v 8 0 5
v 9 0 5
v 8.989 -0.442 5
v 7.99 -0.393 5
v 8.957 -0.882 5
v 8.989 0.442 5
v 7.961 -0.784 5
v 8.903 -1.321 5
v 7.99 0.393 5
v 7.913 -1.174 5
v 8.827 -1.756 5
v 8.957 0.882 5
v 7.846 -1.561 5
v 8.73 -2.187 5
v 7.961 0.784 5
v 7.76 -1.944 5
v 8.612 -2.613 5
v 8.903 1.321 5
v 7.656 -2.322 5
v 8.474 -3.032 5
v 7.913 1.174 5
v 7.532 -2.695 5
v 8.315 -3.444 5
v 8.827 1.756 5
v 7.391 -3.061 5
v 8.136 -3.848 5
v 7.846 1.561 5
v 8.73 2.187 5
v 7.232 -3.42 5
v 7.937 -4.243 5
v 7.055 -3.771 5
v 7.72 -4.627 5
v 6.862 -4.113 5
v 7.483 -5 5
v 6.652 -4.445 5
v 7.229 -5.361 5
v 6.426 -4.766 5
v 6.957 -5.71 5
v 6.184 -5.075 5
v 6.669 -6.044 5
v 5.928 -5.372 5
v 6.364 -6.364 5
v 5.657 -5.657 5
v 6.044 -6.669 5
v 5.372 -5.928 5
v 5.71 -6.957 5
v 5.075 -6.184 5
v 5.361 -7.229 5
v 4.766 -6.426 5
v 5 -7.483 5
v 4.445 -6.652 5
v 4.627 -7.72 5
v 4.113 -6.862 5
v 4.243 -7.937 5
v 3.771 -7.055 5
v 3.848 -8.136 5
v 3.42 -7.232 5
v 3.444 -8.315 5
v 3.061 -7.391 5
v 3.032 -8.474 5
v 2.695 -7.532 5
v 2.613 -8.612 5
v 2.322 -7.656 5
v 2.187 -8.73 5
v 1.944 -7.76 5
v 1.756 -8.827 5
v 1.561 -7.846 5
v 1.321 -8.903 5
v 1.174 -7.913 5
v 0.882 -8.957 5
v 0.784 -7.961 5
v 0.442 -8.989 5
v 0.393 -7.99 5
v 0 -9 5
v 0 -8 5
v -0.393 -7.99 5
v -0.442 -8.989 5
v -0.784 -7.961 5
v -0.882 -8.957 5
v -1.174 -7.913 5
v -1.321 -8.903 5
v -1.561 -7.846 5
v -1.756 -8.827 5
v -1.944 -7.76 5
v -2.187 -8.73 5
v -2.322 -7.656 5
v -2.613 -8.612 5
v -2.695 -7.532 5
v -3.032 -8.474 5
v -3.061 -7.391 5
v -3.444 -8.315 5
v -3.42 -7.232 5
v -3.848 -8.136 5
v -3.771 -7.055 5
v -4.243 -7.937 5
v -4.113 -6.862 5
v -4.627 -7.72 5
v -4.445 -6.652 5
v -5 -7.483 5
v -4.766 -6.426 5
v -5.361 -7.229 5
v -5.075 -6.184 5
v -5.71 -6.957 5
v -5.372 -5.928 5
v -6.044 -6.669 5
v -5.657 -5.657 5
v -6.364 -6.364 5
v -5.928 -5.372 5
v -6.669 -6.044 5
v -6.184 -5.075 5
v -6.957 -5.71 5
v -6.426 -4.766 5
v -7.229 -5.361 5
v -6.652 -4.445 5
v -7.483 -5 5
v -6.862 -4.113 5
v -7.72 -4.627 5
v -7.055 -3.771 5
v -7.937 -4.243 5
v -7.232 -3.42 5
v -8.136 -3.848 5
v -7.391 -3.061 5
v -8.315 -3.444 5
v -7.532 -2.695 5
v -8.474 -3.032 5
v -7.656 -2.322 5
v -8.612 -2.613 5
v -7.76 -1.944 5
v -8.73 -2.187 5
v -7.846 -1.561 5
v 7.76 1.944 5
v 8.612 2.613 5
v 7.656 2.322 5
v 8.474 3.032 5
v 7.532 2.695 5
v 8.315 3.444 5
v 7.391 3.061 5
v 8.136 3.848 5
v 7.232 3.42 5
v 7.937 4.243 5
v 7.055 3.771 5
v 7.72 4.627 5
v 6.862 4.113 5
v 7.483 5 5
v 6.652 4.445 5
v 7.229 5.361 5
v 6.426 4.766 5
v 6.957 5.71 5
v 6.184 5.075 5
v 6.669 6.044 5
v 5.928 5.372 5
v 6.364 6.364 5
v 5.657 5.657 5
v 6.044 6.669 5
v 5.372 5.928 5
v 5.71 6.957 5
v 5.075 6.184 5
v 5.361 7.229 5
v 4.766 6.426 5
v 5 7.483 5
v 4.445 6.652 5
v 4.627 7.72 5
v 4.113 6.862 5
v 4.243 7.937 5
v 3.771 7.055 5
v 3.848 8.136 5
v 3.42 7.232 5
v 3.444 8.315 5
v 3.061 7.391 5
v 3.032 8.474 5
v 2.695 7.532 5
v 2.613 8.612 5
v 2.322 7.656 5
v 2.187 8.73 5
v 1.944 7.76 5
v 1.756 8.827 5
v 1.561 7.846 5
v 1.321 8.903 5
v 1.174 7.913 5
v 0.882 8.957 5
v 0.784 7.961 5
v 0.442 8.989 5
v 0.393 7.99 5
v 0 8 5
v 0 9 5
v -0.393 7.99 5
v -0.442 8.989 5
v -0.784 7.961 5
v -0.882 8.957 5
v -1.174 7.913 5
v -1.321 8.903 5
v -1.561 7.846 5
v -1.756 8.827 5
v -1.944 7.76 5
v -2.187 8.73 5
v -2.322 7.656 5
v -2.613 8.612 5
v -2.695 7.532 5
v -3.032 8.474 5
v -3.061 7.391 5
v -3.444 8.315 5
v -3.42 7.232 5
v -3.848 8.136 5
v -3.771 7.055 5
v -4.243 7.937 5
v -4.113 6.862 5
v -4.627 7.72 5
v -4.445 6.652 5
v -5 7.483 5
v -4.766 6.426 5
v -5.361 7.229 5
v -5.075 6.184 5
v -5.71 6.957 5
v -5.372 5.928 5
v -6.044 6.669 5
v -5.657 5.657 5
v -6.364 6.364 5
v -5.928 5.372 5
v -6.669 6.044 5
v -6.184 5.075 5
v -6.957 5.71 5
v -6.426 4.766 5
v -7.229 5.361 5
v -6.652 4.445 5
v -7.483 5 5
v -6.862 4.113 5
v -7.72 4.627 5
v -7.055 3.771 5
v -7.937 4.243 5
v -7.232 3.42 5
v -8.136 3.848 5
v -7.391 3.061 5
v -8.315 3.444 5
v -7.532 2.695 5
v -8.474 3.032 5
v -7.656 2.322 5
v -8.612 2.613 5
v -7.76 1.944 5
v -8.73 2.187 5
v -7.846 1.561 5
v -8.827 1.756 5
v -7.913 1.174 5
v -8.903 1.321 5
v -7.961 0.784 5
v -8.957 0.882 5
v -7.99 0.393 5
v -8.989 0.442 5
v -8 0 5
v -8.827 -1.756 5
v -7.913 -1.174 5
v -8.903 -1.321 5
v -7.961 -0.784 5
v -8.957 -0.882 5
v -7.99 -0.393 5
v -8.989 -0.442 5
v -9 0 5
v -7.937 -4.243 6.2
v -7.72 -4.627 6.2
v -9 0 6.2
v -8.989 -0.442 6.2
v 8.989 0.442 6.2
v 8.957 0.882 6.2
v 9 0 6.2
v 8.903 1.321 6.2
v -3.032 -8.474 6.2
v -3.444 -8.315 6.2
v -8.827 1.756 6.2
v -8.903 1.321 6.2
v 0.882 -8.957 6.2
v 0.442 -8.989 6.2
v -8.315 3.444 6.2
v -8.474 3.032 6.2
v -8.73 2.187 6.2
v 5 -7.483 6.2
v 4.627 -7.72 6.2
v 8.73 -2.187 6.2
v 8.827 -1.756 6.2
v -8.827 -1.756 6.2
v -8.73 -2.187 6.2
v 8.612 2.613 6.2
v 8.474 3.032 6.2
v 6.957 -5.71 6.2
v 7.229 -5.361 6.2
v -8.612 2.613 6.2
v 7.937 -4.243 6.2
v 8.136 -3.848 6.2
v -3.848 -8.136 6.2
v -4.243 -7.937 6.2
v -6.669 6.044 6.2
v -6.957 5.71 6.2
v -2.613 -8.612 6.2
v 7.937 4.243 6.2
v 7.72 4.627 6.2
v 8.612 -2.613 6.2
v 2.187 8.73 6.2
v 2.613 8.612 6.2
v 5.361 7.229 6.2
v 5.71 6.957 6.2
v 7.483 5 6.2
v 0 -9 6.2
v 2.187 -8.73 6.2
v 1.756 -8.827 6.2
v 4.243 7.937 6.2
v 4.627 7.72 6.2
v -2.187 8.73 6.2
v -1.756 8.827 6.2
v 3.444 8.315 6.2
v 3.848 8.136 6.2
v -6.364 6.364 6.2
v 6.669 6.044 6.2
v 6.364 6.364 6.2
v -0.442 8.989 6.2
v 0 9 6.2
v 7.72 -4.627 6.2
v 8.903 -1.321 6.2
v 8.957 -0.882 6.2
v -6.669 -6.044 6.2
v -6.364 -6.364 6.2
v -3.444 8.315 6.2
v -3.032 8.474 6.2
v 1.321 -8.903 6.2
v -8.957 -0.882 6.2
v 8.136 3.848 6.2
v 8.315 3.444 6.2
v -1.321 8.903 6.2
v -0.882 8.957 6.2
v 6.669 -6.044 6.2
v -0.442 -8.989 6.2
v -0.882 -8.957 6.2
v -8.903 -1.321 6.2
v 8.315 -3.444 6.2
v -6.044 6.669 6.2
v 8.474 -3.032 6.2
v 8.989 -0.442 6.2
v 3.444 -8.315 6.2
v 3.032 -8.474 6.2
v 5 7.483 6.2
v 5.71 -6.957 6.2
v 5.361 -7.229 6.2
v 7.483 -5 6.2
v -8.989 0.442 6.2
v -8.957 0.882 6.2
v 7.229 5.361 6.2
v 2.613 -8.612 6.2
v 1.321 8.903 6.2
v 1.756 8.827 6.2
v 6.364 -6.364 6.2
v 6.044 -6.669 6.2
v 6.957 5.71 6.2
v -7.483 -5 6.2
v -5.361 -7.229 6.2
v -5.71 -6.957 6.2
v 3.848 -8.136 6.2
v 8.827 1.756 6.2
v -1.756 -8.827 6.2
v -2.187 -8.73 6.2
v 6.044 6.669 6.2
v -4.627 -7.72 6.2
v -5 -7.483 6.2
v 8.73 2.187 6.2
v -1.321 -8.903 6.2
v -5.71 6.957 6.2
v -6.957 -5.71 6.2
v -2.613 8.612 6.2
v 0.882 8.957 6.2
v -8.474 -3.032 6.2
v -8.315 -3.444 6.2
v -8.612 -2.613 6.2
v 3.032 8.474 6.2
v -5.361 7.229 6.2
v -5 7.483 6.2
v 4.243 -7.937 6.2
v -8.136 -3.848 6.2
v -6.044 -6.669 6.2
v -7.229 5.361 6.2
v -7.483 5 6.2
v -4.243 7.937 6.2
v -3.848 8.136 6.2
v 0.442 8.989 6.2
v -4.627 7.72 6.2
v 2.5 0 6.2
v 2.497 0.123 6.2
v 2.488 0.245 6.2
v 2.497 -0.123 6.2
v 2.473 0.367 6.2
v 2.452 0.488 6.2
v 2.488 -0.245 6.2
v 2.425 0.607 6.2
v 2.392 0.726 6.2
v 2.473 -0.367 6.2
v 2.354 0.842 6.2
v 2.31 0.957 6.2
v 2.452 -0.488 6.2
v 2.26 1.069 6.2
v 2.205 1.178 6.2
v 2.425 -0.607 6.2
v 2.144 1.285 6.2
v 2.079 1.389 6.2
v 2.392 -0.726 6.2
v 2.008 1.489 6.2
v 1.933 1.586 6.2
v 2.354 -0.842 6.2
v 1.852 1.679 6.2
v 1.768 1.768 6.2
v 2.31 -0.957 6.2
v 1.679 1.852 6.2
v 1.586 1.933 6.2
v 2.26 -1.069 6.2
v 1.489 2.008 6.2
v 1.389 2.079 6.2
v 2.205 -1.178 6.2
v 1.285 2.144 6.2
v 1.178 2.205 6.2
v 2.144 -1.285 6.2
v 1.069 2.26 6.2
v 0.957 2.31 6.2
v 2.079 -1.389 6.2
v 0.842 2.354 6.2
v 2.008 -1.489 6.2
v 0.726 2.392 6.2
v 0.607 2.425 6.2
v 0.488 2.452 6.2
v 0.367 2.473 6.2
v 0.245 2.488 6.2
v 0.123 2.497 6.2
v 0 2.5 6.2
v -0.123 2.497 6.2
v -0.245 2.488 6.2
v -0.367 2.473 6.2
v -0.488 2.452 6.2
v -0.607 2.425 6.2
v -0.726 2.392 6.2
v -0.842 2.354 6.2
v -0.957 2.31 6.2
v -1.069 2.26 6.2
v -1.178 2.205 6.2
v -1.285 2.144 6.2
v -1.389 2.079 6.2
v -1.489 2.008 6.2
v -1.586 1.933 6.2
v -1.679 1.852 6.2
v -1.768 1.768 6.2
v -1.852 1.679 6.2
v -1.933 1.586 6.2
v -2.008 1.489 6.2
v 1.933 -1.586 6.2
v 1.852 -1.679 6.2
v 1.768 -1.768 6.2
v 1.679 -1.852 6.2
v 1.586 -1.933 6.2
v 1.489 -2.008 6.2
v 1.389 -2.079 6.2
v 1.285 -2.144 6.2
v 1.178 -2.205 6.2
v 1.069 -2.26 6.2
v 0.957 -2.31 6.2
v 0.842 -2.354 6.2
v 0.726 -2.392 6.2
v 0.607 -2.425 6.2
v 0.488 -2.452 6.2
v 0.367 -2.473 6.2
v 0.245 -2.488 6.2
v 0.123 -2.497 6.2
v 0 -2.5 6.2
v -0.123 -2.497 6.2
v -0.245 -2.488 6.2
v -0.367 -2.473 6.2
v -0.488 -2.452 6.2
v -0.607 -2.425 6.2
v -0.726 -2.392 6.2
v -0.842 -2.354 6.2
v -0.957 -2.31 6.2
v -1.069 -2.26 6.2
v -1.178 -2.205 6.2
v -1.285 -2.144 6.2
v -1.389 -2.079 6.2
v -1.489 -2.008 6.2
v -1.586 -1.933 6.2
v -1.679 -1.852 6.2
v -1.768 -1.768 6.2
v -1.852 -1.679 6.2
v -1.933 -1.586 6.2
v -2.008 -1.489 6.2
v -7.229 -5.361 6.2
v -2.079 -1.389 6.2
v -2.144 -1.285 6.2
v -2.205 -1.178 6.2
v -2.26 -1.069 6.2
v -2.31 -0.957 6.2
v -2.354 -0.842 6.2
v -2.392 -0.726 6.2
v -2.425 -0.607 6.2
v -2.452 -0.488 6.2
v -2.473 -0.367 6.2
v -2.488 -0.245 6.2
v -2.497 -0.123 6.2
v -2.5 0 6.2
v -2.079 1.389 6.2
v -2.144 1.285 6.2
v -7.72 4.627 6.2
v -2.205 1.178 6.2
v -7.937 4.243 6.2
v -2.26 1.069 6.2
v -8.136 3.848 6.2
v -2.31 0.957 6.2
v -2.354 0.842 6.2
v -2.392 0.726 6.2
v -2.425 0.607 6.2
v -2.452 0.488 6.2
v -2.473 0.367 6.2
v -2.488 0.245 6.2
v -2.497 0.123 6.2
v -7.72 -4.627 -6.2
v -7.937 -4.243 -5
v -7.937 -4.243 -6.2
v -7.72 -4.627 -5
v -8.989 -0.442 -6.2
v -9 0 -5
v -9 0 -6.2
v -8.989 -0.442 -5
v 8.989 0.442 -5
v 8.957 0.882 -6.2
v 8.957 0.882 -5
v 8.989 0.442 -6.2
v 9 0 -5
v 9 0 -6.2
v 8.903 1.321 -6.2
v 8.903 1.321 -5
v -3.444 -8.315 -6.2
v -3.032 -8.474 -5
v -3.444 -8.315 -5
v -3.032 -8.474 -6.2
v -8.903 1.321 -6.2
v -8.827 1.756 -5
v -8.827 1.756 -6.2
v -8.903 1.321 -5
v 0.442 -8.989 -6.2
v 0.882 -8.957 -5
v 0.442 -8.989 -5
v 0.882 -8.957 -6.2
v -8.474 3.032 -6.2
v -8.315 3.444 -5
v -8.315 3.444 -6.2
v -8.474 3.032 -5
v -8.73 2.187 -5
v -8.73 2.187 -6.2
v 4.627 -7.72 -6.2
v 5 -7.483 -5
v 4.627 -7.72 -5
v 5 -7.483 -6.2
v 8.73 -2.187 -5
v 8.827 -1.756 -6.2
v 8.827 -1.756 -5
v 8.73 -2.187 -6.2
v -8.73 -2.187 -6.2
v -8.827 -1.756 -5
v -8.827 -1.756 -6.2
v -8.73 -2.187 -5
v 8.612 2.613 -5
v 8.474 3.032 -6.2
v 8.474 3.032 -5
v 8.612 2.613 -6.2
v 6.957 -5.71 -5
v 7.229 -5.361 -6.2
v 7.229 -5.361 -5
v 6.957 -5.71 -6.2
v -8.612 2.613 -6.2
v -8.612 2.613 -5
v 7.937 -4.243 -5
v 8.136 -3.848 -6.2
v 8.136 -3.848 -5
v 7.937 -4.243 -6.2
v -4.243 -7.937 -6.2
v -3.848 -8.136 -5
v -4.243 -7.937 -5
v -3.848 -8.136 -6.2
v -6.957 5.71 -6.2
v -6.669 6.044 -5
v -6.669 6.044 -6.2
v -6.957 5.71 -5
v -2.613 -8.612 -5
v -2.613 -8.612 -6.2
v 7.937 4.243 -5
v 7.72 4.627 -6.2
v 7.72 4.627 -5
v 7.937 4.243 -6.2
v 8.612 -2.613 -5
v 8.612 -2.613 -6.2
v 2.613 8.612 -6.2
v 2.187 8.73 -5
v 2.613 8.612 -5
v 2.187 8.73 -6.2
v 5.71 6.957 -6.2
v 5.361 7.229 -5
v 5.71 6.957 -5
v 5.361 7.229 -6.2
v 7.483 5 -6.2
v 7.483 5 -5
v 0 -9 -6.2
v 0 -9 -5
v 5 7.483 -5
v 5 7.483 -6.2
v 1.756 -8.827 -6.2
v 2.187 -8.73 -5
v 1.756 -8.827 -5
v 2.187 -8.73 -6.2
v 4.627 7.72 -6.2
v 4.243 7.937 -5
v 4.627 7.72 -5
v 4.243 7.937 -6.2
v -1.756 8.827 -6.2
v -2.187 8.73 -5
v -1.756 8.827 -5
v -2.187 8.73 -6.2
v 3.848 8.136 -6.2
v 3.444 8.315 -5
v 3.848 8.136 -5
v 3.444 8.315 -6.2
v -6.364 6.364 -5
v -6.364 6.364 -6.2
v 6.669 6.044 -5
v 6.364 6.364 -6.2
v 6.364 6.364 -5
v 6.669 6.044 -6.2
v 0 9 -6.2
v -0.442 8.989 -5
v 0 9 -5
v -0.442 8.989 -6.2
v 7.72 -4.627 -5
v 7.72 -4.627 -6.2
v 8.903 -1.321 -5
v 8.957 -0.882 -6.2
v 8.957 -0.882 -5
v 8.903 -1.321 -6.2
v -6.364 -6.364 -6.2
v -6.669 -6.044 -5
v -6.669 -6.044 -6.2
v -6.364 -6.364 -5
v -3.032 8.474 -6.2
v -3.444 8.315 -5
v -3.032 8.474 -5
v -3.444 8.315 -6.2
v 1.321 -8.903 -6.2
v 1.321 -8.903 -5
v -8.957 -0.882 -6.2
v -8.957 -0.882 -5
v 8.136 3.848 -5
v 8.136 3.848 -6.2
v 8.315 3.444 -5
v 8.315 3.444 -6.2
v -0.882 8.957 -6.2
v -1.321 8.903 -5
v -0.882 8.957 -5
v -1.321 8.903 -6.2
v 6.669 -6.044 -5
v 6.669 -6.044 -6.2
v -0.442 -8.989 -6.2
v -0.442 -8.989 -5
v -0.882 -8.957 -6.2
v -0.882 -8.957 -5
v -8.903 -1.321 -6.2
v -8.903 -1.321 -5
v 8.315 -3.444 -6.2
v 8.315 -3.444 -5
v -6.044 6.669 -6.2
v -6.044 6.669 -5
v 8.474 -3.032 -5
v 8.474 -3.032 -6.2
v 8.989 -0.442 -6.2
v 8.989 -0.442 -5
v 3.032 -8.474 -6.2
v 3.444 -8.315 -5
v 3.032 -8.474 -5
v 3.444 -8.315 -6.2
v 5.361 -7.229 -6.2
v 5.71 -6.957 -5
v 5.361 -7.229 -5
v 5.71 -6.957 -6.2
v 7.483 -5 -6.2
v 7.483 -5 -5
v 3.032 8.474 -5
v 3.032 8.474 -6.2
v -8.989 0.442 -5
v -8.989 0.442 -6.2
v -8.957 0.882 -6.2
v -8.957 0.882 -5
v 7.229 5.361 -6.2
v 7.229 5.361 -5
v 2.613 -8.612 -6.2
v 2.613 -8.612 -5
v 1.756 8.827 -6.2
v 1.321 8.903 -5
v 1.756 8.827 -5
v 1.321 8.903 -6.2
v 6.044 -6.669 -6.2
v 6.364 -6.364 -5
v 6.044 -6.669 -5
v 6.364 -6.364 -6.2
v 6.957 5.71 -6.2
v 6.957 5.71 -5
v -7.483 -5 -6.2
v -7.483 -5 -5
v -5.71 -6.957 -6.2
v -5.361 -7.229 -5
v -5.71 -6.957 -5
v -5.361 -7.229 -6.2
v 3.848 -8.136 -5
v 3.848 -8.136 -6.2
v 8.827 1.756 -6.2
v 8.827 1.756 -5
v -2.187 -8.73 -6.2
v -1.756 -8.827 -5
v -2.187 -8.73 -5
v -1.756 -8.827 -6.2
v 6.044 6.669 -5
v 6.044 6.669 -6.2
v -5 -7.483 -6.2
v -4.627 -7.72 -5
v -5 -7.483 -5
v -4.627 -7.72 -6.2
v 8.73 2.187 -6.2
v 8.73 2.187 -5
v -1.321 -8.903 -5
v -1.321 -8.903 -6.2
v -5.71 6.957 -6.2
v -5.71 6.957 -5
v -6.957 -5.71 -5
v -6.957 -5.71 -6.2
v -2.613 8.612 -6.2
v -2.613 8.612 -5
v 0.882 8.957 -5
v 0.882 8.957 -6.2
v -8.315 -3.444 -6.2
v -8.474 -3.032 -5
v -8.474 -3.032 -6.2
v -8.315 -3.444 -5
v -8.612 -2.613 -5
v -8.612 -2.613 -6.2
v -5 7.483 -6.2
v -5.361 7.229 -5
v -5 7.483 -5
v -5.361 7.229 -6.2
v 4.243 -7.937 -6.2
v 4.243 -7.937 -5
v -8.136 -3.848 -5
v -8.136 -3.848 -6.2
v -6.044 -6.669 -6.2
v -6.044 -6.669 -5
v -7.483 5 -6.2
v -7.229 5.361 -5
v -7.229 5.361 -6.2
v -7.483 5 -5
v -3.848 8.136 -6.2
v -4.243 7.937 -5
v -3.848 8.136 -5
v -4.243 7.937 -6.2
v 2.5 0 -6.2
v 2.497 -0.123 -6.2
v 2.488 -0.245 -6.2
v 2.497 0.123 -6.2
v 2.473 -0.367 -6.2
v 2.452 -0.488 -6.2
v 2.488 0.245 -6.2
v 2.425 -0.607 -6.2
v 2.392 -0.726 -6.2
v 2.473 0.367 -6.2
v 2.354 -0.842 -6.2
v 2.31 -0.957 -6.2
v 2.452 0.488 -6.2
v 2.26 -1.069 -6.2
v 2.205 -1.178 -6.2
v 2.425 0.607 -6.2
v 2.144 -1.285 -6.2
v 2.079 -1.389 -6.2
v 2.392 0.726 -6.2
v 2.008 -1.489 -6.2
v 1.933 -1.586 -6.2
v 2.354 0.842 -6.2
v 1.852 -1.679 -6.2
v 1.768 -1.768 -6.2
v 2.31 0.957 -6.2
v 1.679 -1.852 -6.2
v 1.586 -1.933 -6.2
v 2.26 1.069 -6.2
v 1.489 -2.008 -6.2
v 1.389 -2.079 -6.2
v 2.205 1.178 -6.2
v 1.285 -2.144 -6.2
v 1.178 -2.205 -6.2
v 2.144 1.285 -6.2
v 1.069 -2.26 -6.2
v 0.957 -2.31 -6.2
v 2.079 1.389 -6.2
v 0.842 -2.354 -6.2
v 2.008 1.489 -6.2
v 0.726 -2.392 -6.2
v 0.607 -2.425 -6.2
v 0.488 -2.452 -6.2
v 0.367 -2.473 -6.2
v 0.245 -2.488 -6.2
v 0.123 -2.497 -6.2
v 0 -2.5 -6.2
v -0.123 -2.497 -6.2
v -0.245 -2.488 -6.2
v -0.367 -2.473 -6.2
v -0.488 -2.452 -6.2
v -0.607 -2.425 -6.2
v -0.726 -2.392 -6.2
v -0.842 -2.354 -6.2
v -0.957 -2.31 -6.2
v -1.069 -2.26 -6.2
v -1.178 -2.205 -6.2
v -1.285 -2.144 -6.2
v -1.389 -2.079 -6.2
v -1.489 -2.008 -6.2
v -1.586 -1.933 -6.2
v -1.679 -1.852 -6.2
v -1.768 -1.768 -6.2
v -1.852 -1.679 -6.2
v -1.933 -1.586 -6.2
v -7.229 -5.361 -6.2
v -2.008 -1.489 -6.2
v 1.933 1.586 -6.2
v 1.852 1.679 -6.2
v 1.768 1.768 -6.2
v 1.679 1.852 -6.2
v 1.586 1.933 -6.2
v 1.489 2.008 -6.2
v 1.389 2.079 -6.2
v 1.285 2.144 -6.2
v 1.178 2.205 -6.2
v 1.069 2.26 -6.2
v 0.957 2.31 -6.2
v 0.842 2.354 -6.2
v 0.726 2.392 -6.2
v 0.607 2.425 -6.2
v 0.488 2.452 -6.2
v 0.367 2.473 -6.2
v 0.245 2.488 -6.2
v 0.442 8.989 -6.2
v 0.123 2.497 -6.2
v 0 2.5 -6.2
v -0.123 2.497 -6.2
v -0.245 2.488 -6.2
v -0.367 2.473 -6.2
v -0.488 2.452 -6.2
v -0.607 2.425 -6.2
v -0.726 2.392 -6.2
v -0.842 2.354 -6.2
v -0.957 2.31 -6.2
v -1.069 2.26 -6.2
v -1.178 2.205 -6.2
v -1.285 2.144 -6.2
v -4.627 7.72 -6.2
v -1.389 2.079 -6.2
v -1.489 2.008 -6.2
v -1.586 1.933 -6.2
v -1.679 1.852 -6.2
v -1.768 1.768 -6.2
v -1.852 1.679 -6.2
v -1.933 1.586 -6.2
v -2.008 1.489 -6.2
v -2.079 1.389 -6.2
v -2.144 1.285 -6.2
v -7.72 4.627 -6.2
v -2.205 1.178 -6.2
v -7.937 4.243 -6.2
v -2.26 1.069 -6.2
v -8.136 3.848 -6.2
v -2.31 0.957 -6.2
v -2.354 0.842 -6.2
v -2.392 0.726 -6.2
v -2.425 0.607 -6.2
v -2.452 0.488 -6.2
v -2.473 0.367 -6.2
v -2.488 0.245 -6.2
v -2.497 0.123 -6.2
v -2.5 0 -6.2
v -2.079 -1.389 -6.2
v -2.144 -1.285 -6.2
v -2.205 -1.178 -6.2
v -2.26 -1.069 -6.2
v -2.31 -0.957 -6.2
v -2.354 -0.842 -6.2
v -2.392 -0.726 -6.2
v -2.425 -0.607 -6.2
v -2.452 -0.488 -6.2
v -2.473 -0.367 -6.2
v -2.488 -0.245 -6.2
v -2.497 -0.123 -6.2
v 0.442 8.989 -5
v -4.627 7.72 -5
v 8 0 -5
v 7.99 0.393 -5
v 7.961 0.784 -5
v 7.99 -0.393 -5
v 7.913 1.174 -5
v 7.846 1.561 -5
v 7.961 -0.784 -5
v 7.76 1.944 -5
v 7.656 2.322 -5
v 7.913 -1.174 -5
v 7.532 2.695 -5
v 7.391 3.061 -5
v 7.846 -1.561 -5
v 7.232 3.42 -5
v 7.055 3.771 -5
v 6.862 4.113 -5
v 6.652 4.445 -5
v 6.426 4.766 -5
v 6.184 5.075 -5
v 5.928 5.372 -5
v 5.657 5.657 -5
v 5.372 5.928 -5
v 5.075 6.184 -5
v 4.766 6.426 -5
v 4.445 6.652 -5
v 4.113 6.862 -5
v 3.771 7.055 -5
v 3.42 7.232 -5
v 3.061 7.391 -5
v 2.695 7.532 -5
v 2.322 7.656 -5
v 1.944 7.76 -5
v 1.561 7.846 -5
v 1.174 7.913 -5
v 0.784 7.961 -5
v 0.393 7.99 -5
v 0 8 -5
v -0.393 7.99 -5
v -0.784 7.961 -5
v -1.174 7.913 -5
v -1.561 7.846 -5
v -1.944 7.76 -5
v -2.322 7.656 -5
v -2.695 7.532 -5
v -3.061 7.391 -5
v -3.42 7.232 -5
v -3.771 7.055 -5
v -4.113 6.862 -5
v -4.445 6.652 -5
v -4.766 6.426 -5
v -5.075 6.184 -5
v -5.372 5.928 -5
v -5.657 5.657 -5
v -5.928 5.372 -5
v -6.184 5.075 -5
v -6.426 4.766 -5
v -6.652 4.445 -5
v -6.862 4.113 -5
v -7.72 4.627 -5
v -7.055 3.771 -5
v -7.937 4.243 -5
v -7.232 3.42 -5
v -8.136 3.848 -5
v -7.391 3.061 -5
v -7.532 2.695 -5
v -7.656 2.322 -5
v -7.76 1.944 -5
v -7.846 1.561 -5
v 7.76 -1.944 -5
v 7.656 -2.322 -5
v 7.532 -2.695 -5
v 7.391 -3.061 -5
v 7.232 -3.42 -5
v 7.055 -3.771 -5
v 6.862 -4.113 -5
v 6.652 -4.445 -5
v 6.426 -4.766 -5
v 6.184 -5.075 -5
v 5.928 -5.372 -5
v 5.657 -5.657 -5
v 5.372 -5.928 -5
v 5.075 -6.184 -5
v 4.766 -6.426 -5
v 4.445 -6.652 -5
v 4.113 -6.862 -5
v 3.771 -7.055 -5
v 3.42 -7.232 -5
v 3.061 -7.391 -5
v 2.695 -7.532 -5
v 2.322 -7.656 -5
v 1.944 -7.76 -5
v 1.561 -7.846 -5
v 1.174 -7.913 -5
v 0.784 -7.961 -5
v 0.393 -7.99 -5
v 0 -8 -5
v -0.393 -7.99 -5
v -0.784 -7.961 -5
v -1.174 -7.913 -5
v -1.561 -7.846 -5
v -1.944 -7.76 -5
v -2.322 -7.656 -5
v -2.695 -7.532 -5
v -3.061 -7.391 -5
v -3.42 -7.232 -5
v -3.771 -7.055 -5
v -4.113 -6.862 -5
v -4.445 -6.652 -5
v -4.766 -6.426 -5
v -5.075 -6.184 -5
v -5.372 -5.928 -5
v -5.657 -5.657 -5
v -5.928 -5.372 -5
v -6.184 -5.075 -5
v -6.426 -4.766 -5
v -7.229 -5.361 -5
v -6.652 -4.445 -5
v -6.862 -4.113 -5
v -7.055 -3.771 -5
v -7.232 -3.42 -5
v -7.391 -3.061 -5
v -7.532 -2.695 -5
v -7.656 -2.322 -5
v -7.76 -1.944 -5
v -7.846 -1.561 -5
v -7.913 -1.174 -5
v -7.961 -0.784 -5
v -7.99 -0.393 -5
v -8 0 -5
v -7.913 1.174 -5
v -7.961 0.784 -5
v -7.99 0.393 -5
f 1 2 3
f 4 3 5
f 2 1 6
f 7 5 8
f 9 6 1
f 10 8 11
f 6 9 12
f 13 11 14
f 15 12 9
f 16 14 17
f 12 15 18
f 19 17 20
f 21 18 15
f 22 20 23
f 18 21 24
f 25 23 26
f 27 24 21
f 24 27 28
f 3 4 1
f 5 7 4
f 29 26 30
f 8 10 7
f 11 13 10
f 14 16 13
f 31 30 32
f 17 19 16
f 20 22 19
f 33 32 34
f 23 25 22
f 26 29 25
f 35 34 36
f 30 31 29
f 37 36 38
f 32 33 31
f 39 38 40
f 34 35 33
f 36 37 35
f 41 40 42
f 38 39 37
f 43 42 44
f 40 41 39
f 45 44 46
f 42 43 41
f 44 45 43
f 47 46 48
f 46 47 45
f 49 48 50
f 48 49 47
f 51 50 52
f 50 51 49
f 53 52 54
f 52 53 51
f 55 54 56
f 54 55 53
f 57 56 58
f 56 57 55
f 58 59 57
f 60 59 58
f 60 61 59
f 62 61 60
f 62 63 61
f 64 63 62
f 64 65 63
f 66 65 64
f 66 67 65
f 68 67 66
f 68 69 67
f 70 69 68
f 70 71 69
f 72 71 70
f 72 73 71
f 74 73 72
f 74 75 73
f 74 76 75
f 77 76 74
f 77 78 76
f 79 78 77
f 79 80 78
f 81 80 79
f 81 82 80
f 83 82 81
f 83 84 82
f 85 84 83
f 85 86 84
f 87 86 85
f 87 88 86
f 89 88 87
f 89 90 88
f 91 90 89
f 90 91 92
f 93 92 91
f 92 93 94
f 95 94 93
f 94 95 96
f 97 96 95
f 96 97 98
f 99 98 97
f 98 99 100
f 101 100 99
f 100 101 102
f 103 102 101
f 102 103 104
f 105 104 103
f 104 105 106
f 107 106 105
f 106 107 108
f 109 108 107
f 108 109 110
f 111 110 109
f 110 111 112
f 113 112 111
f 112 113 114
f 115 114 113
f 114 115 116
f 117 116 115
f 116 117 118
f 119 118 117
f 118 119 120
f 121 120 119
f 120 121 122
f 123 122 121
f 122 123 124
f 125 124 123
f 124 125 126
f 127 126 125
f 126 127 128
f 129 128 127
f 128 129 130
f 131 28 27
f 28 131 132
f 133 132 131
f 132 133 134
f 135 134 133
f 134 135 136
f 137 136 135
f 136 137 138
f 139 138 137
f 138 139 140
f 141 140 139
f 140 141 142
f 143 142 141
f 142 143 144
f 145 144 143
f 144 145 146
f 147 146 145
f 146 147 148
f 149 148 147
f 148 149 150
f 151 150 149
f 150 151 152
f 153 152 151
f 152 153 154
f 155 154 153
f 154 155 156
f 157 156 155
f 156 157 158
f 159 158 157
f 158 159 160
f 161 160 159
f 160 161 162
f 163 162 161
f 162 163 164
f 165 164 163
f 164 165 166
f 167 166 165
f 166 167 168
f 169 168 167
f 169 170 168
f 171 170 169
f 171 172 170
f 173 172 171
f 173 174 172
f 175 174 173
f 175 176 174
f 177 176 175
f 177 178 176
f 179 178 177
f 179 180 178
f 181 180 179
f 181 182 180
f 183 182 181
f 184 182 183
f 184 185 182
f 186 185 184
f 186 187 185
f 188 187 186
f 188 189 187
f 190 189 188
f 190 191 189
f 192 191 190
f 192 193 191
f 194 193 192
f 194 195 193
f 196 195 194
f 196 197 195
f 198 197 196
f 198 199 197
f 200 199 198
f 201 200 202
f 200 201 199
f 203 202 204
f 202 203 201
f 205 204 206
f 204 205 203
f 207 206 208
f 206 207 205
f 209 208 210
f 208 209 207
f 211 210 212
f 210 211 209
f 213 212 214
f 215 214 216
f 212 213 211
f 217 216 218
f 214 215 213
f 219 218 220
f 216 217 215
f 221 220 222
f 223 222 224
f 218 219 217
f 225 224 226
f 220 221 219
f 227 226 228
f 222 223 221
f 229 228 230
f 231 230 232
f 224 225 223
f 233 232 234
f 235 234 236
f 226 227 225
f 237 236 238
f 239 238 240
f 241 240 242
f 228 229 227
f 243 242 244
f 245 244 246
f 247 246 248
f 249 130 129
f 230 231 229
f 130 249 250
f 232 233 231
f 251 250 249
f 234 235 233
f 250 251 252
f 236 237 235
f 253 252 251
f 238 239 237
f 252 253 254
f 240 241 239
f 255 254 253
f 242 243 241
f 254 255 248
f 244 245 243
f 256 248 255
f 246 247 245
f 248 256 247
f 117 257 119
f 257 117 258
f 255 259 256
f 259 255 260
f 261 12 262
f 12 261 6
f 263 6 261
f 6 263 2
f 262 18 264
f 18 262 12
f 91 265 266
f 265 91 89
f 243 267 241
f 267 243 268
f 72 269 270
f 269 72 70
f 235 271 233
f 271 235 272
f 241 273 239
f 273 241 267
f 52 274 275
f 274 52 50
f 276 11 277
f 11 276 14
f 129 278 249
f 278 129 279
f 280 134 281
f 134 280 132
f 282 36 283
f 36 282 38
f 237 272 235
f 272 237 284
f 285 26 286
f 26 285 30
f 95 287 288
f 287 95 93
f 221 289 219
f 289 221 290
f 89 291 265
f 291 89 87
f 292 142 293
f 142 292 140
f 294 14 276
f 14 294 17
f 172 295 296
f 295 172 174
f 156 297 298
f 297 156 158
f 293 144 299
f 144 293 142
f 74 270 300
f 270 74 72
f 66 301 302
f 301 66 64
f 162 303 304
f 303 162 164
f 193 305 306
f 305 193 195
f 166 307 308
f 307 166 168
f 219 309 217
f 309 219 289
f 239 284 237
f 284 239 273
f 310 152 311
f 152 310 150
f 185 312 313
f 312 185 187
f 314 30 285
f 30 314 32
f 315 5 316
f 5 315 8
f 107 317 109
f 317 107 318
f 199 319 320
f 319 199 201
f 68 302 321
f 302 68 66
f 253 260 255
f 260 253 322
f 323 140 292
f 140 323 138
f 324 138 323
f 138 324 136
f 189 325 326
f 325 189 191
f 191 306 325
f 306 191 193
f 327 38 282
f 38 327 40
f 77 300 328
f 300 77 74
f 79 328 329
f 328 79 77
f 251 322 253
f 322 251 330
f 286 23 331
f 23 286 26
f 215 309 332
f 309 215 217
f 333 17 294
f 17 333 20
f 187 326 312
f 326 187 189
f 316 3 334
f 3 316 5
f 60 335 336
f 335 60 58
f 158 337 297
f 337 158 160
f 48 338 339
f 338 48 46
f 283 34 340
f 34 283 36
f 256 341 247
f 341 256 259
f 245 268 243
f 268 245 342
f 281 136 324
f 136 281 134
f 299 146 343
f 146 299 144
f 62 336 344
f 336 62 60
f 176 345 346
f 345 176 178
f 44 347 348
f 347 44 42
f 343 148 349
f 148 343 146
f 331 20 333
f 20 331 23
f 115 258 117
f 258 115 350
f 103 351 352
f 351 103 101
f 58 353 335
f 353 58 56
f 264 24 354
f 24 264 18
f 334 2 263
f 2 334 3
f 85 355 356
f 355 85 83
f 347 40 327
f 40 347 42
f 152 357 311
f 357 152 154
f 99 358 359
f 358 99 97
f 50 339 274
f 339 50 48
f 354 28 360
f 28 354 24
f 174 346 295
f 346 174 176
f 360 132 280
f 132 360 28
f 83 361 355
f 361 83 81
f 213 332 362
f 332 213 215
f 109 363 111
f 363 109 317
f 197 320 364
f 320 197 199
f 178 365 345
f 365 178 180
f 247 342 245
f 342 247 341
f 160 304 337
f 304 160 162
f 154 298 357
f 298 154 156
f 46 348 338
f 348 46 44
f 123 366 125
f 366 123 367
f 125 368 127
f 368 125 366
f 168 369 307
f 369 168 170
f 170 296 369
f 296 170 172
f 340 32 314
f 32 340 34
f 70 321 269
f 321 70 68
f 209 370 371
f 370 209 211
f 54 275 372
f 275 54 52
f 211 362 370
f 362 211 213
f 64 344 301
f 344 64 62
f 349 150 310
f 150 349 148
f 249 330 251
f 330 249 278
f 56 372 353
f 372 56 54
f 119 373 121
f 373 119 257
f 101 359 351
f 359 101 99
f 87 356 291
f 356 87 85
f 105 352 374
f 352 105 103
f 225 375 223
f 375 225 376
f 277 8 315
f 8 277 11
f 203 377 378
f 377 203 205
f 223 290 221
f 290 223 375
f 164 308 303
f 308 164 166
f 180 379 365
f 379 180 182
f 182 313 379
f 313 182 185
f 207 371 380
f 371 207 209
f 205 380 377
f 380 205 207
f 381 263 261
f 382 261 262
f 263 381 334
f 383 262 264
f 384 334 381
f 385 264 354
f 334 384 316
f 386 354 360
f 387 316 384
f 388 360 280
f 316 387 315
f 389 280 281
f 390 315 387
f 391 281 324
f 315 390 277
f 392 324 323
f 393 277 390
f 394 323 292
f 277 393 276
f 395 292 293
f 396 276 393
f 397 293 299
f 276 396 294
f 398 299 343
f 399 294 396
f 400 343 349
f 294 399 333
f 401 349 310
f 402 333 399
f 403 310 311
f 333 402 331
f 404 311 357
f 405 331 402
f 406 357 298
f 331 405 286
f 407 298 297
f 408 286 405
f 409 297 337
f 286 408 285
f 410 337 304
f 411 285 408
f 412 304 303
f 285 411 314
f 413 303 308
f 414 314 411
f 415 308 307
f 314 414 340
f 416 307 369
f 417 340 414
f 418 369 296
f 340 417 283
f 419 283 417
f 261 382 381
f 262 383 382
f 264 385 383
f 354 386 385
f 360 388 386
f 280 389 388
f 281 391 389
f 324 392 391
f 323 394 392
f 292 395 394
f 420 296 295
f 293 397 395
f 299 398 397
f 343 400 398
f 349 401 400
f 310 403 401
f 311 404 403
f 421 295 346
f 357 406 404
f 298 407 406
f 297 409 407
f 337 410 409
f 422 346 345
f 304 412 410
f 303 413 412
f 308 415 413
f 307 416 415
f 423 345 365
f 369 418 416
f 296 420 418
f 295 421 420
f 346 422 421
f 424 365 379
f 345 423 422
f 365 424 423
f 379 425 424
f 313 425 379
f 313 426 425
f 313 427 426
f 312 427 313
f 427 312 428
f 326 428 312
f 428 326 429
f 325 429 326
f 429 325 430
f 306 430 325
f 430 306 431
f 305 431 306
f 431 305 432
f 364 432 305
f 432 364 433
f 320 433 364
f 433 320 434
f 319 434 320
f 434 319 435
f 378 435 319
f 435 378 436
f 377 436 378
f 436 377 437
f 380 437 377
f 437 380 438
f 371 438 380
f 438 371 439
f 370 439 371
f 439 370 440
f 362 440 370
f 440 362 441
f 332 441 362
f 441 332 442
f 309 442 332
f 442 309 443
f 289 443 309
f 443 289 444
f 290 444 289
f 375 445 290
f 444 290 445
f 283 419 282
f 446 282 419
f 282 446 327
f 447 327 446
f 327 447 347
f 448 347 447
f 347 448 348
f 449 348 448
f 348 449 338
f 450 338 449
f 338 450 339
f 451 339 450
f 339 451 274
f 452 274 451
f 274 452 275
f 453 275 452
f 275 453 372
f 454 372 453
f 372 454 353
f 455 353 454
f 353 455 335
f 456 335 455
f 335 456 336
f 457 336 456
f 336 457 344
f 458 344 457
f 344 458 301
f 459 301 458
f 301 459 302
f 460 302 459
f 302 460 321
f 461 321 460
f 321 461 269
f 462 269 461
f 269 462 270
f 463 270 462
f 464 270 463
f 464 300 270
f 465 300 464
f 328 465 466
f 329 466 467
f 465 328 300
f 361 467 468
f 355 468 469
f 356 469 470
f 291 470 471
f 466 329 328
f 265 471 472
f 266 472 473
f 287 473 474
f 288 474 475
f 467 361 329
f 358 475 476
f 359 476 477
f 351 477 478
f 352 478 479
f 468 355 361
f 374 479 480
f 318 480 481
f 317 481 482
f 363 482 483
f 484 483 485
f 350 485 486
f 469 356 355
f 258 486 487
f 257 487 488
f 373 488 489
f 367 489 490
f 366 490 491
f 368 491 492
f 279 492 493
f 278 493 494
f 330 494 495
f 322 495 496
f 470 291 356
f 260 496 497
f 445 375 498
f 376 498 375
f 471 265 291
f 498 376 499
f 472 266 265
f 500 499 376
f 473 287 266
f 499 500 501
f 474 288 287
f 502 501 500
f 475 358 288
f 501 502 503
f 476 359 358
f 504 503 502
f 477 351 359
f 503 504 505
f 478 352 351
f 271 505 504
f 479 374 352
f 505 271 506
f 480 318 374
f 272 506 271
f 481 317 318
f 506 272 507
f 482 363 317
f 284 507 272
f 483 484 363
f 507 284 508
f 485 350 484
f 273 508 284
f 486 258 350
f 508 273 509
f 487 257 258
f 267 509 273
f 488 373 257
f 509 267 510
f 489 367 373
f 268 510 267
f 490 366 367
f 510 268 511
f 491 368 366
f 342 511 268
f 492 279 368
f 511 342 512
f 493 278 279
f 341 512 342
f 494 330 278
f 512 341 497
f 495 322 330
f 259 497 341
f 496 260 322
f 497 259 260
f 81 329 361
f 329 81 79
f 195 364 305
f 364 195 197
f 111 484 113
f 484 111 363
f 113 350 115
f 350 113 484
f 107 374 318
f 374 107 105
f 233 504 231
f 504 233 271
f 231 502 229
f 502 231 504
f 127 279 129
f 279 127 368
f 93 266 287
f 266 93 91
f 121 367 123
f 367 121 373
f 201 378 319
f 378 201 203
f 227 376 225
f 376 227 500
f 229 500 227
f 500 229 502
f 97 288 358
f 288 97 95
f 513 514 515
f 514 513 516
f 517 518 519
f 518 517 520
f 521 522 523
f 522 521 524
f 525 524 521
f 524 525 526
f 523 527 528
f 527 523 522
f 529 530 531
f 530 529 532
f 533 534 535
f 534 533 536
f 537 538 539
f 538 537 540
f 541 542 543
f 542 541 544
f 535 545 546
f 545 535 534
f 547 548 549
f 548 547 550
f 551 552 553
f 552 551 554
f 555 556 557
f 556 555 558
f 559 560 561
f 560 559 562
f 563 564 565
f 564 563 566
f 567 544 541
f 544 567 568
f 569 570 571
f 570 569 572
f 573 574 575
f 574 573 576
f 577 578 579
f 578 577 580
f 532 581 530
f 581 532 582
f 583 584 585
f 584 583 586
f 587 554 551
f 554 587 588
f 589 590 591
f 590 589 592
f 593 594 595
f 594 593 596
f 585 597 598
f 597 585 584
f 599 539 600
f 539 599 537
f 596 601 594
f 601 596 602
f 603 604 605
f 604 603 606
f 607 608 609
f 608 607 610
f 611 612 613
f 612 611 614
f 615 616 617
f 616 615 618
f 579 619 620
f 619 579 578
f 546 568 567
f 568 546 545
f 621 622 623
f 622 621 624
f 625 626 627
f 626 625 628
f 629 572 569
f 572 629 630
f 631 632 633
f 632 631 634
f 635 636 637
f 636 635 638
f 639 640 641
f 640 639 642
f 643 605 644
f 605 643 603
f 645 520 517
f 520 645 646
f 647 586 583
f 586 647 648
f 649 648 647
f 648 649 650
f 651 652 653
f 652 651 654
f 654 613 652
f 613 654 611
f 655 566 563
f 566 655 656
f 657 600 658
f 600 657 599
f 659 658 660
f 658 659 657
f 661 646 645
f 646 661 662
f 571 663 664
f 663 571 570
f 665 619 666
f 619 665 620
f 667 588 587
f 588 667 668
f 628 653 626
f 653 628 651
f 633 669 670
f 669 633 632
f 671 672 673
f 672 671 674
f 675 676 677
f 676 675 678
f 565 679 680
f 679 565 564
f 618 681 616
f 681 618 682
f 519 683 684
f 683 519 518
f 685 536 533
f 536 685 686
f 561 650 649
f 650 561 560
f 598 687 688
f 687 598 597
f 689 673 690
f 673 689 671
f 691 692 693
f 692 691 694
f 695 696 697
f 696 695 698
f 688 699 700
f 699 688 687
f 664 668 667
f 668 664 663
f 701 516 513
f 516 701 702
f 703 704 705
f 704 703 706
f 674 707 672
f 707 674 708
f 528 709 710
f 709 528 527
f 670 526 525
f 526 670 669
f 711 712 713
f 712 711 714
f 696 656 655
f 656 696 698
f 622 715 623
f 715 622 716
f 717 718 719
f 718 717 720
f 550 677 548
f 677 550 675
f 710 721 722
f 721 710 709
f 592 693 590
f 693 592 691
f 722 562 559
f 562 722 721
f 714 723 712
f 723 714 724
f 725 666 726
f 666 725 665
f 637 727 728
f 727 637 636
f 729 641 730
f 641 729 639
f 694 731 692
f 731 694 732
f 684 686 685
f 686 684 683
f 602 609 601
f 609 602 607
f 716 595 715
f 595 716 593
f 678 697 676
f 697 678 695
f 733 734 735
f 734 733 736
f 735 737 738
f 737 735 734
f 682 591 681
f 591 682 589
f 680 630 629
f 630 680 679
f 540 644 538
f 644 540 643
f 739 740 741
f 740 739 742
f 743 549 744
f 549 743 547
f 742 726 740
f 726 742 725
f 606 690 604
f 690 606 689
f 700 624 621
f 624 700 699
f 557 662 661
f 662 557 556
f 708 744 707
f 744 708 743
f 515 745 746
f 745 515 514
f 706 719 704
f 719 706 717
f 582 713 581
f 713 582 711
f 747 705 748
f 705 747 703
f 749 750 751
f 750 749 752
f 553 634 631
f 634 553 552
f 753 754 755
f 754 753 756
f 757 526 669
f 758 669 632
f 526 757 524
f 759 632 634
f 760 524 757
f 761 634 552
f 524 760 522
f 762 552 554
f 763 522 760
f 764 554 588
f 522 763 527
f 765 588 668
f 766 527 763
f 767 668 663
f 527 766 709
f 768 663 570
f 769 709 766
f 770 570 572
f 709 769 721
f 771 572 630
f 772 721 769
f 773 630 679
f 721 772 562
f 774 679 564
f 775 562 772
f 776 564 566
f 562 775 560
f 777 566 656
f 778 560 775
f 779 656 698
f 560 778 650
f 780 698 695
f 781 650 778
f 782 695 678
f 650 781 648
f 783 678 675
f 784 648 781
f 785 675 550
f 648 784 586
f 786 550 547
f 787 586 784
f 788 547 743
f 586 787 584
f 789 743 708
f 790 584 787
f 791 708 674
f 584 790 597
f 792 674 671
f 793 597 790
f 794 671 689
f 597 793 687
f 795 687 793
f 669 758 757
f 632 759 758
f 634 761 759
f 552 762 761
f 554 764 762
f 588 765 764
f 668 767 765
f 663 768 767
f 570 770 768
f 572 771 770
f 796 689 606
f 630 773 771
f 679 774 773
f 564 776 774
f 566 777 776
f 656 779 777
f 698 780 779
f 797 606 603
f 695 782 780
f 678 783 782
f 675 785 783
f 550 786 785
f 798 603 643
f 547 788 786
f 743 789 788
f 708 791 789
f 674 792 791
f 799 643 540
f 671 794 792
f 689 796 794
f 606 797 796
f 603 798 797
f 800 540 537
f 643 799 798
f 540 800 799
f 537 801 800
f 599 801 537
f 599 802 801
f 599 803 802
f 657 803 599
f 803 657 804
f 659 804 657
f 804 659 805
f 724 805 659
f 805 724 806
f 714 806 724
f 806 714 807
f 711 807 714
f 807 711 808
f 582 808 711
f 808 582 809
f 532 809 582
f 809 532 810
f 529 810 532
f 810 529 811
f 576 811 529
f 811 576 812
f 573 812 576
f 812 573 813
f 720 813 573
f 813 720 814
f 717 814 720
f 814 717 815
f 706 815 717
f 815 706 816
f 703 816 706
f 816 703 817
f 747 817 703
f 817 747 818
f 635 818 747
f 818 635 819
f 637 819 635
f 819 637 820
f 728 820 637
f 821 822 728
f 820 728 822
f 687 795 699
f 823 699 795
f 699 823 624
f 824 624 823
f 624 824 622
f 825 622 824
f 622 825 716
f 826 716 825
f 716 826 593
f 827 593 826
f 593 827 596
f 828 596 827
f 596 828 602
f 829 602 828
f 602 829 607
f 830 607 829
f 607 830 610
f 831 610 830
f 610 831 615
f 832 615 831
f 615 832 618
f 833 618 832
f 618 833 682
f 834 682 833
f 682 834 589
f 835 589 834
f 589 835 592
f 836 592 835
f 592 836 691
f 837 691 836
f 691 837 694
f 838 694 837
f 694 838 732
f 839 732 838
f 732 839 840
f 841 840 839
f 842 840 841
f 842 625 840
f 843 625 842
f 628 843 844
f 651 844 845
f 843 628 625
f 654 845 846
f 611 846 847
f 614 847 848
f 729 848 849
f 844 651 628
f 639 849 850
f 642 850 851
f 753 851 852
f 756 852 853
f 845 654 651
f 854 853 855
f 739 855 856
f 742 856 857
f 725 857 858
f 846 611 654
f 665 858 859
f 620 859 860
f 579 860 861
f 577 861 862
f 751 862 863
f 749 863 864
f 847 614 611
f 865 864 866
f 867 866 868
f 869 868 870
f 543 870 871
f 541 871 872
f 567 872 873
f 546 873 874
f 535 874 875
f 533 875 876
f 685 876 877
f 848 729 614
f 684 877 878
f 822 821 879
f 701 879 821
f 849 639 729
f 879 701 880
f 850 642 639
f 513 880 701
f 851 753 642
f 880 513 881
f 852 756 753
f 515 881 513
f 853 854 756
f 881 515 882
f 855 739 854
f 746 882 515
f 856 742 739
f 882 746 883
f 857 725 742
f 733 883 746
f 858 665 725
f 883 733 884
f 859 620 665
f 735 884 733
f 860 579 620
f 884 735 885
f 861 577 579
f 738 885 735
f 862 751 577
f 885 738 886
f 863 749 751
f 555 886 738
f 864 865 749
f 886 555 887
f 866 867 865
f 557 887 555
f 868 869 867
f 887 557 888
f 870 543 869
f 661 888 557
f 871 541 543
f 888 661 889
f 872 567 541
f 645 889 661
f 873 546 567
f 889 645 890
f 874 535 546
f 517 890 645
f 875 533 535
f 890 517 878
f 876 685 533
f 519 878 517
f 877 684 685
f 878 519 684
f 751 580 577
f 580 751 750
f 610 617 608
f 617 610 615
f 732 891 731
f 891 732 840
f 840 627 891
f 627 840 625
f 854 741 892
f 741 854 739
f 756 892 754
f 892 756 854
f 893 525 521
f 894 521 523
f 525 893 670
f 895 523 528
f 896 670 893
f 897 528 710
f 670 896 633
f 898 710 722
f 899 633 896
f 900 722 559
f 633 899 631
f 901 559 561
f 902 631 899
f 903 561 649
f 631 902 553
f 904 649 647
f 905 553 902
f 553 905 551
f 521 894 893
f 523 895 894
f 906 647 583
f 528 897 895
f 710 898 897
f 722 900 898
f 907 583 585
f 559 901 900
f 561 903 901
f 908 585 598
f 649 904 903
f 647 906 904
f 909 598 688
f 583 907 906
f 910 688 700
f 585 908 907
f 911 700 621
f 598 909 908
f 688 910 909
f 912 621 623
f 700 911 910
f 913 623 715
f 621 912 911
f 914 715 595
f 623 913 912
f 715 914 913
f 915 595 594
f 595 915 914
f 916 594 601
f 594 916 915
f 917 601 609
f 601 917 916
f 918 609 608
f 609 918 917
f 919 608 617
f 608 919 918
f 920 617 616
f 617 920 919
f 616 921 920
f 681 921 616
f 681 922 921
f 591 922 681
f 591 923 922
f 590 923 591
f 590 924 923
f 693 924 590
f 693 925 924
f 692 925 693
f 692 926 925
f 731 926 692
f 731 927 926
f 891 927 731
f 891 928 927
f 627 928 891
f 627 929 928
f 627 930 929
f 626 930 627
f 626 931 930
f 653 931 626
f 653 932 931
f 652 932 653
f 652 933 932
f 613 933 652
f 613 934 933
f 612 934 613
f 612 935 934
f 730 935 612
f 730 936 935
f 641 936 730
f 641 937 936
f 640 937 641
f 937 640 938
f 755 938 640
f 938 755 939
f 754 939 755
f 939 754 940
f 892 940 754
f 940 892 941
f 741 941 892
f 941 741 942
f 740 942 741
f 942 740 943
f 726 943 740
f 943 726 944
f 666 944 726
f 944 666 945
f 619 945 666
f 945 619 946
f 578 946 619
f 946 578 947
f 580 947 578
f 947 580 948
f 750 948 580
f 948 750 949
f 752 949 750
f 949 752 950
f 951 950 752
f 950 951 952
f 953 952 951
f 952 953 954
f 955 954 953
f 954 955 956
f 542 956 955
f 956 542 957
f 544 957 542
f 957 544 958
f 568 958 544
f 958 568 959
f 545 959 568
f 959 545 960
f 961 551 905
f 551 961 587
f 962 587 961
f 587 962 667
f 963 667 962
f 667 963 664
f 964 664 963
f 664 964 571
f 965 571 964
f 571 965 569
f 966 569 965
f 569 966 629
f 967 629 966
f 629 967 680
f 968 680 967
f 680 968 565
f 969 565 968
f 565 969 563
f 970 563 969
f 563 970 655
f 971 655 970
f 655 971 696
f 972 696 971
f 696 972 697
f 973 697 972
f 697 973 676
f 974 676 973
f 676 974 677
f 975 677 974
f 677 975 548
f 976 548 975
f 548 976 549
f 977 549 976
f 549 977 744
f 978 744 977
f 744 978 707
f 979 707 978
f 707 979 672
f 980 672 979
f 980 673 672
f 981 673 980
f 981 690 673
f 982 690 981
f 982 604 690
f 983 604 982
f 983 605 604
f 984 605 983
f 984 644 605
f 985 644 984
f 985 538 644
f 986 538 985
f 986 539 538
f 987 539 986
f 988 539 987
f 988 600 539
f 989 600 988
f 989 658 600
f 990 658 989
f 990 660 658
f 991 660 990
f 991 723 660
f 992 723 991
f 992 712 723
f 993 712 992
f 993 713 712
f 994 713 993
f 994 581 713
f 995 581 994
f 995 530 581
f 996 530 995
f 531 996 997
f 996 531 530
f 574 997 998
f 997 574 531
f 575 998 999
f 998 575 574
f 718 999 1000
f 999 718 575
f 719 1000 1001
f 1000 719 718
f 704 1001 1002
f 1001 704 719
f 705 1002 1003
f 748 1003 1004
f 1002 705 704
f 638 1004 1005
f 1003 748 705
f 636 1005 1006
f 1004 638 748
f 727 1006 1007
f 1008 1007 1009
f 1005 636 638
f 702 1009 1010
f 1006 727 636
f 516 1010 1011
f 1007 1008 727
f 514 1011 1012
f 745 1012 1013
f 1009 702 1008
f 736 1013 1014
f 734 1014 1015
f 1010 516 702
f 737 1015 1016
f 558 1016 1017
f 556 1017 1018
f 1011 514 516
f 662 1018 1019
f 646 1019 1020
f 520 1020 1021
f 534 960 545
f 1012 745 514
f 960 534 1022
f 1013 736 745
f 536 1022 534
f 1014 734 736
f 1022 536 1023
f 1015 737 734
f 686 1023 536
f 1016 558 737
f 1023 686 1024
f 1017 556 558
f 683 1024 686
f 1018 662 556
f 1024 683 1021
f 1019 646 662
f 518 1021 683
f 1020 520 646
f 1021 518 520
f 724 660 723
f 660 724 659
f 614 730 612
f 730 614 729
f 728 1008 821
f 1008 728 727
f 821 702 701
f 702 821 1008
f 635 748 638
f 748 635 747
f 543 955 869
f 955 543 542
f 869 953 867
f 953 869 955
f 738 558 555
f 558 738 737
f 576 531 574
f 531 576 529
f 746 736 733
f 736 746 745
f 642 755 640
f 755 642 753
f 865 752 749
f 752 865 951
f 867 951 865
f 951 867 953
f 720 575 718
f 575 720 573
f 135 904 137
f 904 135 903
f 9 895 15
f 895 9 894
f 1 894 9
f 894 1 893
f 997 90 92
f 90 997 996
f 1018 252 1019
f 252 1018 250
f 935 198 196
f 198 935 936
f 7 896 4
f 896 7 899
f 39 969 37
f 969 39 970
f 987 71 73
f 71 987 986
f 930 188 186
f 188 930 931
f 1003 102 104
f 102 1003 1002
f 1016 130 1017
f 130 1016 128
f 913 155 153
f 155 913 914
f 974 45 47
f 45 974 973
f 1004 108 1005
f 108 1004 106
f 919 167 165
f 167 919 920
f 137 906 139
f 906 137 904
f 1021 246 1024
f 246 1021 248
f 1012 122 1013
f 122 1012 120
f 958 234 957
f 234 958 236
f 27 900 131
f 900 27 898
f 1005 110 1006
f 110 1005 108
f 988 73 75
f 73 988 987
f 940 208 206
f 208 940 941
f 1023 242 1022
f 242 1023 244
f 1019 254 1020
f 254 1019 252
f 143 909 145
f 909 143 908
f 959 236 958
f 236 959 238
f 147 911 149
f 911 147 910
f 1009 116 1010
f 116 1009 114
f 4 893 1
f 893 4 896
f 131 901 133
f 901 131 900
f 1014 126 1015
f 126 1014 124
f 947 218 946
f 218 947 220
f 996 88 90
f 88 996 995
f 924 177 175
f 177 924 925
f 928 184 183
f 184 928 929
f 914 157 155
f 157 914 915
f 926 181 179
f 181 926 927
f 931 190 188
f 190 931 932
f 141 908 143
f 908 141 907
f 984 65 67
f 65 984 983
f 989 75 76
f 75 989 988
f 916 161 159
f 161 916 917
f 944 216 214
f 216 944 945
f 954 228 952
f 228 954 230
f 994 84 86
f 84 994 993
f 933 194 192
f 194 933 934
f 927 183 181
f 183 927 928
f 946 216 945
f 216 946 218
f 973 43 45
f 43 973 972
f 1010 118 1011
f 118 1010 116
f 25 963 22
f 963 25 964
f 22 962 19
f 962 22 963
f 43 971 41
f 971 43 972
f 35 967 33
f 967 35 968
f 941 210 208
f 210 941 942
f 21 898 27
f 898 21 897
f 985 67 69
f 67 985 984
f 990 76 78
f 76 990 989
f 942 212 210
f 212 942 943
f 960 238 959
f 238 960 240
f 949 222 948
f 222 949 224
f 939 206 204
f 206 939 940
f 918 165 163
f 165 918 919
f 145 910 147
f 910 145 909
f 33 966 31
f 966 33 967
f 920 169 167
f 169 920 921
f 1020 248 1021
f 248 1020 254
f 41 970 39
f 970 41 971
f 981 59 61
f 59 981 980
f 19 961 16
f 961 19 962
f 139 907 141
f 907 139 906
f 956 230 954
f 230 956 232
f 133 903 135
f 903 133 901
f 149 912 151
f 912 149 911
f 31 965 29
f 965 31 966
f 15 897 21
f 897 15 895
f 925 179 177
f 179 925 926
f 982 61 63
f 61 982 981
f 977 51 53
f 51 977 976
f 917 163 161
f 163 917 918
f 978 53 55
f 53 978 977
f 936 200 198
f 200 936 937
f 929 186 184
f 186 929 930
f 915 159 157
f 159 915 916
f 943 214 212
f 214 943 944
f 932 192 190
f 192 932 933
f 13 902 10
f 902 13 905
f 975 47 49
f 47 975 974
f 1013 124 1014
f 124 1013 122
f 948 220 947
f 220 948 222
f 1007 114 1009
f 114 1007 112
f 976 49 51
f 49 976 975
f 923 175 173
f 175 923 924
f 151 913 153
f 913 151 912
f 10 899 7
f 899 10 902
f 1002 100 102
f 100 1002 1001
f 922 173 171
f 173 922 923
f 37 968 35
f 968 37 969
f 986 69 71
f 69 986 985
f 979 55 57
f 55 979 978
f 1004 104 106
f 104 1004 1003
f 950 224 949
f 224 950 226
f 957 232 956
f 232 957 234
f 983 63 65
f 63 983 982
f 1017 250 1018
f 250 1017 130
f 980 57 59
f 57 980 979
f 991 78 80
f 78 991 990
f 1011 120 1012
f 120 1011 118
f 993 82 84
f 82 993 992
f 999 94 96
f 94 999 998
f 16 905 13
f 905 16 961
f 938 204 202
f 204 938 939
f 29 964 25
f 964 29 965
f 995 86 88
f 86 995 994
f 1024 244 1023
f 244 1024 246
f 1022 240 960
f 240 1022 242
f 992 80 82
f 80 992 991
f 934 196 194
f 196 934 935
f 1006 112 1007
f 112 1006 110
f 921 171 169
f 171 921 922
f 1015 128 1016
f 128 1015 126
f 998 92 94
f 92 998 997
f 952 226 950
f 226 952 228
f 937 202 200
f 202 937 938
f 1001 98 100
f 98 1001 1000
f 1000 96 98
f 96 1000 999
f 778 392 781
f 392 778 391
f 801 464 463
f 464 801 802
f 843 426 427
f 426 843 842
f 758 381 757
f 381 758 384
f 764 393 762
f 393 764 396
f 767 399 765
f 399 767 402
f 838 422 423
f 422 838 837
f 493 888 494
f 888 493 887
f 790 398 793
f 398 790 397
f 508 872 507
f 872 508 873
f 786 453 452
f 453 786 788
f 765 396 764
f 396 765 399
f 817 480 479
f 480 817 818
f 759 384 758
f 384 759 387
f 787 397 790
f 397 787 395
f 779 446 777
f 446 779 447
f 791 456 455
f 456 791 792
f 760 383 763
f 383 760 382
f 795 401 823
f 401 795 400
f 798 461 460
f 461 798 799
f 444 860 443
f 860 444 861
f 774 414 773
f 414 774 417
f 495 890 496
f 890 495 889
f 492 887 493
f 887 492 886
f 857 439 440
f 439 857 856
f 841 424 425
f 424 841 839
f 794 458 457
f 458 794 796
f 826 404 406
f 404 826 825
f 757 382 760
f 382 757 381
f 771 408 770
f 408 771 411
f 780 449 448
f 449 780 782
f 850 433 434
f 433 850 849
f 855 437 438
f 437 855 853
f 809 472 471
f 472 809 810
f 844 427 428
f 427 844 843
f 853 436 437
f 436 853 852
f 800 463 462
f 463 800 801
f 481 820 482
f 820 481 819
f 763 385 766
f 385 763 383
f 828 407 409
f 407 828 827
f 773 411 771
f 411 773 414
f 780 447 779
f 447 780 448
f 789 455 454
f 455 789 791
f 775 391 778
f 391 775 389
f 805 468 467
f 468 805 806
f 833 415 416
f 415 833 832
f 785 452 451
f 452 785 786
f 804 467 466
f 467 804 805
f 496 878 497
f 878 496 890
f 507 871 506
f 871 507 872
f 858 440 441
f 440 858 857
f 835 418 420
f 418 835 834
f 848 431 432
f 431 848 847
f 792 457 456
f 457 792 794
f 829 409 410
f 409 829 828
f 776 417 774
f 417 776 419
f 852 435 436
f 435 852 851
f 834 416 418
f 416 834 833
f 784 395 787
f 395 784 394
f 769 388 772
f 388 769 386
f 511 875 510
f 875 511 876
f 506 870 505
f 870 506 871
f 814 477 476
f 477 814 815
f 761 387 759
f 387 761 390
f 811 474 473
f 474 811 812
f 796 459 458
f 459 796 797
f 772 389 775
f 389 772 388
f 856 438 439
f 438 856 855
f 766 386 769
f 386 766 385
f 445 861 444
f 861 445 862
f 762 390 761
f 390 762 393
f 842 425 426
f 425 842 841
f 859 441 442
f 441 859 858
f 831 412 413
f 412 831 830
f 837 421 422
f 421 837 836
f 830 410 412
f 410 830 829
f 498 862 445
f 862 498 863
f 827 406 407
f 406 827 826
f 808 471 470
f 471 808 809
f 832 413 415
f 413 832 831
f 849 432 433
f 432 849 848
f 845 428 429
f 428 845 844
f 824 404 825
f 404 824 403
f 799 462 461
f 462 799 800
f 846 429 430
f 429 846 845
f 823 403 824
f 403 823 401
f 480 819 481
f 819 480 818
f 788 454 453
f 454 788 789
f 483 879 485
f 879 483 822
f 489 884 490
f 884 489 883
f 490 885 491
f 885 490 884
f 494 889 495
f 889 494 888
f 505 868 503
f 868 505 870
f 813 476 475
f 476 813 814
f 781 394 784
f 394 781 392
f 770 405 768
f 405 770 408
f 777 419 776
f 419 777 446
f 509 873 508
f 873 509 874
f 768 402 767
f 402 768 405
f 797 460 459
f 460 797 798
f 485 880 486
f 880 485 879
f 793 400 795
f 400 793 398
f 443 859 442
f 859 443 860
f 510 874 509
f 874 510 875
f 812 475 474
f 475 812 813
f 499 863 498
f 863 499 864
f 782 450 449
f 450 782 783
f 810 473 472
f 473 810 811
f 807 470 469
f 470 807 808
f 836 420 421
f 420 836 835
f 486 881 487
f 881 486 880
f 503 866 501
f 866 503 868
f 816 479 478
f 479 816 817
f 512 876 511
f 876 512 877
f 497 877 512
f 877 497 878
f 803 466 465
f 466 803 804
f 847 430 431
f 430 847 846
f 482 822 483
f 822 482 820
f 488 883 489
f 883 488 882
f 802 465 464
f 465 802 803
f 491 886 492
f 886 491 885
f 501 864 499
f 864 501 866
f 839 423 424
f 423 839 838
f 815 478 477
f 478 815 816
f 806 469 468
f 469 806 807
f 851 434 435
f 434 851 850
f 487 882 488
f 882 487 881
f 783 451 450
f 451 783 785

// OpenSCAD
$fn=128;

teeth = 20;
pitch_d = 12.22;
pitch_r = pitch_d/2;

pulley_width = 10;
hub_d = 16;
hub_r = hub_d/2;

bore_d = 5;
bore_r = bore_d/2;

flange_d = 18;
flange_r = flange_d/2;
flange_th = 1.2;

tooth_height = 1.2;
tooth_tip_r = pitch_r + tooth_height;
tooth_root_r = pitch_r - 0.6;

tooth_arc_factor = 0.55;
tooth_ang = 360/teeth;
tooth_arc = tooth_ang * tooth_arc_factor;

module tooth2d(r_root, r_tip, ang_span){
    polygon(points=[
        [r_root*cos(-ang_span/2), r_root*sin(-ang_span/2)],
        [r_tip*cos(-ang_span/2),  r_tip*sin(-ang_span/2)],
        [r_tip*cos( ang_span/2),  r_tip*sin( ang_span/2)],
        [r_root*cos( ang_span/2), r_root*sin( ang_span/2)]
    ]);
}

module teeth_ring(){
    for(i=[0:teeth-1]){
        rotate([0,0,i*tooth_ang])
            linear_extrude(height=pulley_width, center=true, convexity=10)
                tooth2d(tooth_root_r, tooth_tip_r, tooth_arc);
    }
}

module body(){
    union(){
        cylinder(h=pulley_width, r=pitch_r, center=true, $fn=128);
        teeth_ring();
        translate([0,0, pulley_width/2 + flange_th/2])
            cylinder(h=flange_th, r=flange_r, center=true, $fn=128);
        translate([0,0,-pulley_width/2 - flange_th/2])
            cylinder(h=flange_th, r=flange_r, center=true, $fn=128);
        cylinder(h=pulley_width + 2*flange_th, r=hub_r, center=true, $fn=128);
    }
}

difference(){
    body();
    cylinder(h=pulley_width + 2*flange_th + 2, r=bore_r, center=true, $fn=128);
}
